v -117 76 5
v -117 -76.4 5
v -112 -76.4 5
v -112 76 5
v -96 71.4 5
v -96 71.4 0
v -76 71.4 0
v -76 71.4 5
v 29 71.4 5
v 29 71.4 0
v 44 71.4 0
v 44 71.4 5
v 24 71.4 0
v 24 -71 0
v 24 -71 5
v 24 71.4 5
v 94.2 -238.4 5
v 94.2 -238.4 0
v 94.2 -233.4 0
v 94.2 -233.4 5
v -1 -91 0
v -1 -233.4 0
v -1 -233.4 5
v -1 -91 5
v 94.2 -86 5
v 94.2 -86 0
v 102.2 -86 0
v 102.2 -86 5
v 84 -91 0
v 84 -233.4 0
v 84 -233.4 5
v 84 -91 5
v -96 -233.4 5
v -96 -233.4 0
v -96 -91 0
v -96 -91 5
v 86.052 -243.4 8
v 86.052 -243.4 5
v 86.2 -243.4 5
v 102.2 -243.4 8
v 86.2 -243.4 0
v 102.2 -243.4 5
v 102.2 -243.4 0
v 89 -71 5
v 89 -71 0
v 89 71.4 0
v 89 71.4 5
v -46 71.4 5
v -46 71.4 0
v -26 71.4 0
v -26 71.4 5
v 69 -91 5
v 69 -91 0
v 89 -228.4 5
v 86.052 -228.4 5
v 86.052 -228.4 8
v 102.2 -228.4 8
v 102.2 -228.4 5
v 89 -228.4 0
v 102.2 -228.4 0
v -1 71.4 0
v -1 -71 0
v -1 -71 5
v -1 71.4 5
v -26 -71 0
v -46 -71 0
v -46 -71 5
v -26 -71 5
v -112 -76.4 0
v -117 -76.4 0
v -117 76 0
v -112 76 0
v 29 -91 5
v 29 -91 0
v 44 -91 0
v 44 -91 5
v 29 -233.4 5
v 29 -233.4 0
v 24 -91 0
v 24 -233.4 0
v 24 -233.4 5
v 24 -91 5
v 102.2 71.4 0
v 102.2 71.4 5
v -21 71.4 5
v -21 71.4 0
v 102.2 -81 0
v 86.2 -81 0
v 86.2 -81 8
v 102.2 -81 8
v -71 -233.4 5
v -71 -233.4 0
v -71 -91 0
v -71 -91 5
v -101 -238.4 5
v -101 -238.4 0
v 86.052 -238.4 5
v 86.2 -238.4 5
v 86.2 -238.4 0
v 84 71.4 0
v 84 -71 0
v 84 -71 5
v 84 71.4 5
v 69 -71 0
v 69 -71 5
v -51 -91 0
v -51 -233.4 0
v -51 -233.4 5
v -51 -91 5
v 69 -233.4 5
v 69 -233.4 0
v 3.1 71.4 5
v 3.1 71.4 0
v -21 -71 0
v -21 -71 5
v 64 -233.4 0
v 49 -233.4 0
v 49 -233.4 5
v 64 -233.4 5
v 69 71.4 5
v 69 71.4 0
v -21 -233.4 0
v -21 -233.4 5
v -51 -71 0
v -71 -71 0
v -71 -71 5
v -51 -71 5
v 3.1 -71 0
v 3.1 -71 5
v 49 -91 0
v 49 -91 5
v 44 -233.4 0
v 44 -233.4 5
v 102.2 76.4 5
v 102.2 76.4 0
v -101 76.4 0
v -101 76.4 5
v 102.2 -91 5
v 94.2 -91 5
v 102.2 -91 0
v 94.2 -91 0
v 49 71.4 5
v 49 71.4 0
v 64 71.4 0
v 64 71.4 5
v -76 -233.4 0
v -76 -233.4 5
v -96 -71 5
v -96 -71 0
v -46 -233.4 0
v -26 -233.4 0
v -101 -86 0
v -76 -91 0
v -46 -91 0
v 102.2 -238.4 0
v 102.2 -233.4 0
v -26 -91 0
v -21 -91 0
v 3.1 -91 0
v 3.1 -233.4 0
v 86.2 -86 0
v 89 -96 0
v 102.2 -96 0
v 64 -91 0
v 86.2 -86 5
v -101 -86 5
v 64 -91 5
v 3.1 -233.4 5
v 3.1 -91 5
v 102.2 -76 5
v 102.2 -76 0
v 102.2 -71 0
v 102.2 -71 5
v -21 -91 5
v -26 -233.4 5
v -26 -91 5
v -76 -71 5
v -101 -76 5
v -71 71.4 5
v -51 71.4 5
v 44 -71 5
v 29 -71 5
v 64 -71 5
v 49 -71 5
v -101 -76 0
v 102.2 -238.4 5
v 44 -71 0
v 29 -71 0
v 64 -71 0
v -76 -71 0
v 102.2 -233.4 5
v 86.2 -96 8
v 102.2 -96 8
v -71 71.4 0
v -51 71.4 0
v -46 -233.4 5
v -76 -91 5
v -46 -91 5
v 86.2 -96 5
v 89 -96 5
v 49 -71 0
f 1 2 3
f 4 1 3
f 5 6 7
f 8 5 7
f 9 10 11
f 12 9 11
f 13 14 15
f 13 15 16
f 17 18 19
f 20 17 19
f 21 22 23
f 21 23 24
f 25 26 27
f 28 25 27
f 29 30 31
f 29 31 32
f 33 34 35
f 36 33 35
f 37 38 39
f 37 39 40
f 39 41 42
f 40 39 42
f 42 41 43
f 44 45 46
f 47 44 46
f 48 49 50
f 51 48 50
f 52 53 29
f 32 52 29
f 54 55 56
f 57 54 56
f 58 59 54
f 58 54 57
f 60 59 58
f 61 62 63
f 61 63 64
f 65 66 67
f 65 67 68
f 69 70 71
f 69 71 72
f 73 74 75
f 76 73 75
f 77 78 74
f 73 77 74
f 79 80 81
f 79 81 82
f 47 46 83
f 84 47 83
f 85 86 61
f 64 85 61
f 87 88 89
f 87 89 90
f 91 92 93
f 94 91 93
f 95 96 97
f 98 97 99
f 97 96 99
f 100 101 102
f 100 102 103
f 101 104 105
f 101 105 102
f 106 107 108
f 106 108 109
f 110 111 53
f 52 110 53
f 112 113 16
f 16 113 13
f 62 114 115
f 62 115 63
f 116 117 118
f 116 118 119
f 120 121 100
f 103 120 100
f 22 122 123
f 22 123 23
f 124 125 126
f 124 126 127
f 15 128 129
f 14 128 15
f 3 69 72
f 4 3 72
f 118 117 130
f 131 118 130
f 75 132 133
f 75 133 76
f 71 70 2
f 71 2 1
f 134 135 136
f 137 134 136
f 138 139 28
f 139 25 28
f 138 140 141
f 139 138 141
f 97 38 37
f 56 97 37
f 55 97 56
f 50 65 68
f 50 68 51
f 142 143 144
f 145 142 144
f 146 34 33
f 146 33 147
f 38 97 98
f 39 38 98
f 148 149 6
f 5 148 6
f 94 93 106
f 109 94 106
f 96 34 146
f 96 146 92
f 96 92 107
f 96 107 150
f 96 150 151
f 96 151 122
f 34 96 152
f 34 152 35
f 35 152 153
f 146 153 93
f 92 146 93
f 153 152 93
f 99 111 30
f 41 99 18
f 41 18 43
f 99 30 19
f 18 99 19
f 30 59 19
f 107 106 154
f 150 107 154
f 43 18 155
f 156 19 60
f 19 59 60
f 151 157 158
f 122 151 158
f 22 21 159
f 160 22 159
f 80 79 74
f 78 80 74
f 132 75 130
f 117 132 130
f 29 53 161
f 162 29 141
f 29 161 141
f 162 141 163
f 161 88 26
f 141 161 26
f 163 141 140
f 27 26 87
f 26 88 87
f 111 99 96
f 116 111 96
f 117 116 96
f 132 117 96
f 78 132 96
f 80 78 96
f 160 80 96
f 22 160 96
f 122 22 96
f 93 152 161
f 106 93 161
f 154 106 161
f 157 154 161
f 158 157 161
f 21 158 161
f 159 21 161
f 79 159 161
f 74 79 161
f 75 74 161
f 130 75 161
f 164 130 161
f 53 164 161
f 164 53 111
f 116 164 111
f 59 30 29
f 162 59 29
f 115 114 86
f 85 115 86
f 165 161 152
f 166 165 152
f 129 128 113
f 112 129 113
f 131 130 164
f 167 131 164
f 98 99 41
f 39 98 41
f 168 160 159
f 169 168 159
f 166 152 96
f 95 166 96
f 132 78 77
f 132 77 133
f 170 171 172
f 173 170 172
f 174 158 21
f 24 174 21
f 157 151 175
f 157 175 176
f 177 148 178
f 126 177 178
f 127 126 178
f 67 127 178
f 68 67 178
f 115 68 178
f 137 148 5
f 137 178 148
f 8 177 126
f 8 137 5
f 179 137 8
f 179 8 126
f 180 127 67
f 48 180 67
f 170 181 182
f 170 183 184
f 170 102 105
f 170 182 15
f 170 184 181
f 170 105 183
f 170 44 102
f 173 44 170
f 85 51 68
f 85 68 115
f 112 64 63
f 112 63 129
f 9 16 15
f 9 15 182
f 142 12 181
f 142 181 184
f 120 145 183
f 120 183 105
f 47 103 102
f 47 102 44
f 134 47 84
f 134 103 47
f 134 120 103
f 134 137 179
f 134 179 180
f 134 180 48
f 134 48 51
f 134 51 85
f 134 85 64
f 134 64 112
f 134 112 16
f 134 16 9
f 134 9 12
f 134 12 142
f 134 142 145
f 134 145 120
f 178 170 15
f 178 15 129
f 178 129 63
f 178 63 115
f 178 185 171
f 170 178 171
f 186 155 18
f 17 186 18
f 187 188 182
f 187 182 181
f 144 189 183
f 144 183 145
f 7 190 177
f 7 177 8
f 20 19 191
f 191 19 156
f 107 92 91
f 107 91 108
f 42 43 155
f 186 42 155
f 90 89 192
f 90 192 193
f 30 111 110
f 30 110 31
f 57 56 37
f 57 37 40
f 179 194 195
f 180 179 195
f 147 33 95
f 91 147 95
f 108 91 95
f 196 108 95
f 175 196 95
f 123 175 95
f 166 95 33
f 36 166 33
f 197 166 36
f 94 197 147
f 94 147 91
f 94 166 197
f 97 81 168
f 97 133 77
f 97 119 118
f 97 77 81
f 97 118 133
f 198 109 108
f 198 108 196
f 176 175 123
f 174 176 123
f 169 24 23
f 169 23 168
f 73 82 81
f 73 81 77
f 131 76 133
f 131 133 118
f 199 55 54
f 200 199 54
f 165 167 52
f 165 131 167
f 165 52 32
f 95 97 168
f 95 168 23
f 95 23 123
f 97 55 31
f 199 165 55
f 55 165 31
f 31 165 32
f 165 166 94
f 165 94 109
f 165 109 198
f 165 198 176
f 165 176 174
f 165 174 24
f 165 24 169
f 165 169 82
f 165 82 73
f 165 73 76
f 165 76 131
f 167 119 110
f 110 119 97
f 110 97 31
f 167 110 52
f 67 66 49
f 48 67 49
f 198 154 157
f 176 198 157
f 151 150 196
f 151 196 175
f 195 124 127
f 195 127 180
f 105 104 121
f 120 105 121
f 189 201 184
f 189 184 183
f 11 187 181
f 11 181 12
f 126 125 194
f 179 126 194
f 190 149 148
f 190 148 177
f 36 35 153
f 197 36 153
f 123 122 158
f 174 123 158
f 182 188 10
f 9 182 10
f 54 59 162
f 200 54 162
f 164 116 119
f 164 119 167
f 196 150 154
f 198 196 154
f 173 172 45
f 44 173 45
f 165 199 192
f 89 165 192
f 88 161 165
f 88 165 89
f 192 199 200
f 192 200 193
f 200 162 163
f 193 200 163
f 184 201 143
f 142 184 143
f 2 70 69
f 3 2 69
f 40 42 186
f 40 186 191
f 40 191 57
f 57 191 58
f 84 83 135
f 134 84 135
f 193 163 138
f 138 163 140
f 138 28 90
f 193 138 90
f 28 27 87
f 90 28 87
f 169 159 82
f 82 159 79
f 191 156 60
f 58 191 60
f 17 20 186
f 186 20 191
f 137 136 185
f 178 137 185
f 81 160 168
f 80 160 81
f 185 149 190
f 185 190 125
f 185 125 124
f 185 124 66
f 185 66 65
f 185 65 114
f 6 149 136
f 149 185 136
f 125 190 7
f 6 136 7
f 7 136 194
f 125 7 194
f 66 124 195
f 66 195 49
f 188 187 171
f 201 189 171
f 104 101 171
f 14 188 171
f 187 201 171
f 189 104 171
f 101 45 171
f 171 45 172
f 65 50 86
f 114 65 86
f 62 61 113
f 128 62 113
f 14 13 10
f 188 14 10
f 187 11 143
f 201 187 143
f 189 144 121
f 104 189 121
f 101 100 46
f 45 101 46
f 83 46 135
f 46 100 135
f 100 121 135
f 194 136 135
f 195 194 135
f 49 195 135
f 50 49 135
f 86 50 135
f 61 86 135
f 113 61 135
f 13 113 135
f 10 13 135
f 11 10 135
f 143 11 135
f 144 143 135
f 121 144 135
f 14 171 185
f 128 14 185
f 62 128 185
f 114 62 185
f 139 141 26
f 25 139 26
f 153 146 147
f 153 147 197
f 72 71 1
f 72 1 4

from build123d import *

# Parameters (mm, degrees)
F0_W     = 20
F0_H     = 142.4
F0_W_2   = 20.9
F0_W_3   = 15
F1_DEPTH = 5
F2_W     = 16
F2_H     = 15
F2_W_2   = 16.148469
F3_DEPTH = 3
F4_W     = 5
F4_H     = 152.4
F5_DEPTH = 5


with BuildPart() as f1:
    # F0 (on Top) → F1 (new body)
    with BuildSketch(Plane.XY):
        Polygon((102.2, 71.4), (102.2, 76.4), (-101, 76.4), (-101, -76), (102.2, -76), (102.2, -71), (89, -71), (89, 71.4), align=None)
        with Locations((-86, 0.2)):
            Rectangle(F0_W, F0_H, mode=Mode.SUBTRACT)
        with Locations((-61, 0.2)):
            Rectangle(F0_W, F0_H, mode=Mode.SUBTRACT)
        with Locations((-36, 0.2)):
            Rectangle(F0_W, F0_H, mode=Mode.SUBTRACT)
        with Locations((-11, 0.2)):
            Rectangle(F0_W, F0_H, mode=Mode.SUBTRACT)
        with Locations((13.55, 0.2)):
            Rectangle(F0_W_2, F0_H, mode=Mode.SUBTRACT)
        with Locations((36.5, 0.2)):
            Rectangle(F0_W_3, F0_H, mode=Mode.SUBTRACT)
        with Locations((56.5, 0.2)):
            Rectangle(F0_W_3, F0_H, mode=Mode.SUBTRACT)
        with Locations((76.5, 0.2)):
            Rectangle(F0_W_3, F0_H, mode=Mode.SUBTRACT)
        Polygon((-101, -238.4), (86.2, -238.4), (86.2, -243.4), (102.2, -243.4), (102.2, -238.4), (94.2, -238.4), (94.2, -233.4), (102.2, -233.4), (102.2, -228.4), (89, -228.4), (89, -96), (102.2, -96), (102.2, -91), (94.2, -91), (94.2, -86), (102.2, -86), (102.2, -81), (86.2, -81), (86.2, -86), (-101, -86), align=None)
        with Locations((-86, -162.2)):
            Rectangle(F0_W, F0_H, mode=Mode.SUBTRACT)
        with Locations((-61, -162.2)):
            Rectangle(F0_W, F0_H, mode=Mode.SUBTRACT)
        with Locations((-36, -162.2)):
            Rectangle(F0_W, F0_H, mode=Mode.SUBTRACT)
        with Locations((-11, -162.2)):
            Rectangle(F0_W, F0_H, mode=Mode.SUBTRACT)
        with Locations((13.55, -162.2)):
            Rectangle(F0_W_2, F0_H, mode=Mode.SUBTRACT)
        with Locations((36.5, -162.2)):
            Rectangle(F0_W_3, F0_H, mode=Mode.SUBTRACT)
        with Locations((56.5, -162.2)):
            Rectangle(F0_W_3, F0_H, mode=Mode.SUBTRACT)
        with Locations((76.5, -162.2)):
            Rectangle(F0_W_3, F0_H, mode=Mode.SUBTRACT)
    extrude(amount=F1_DEPTH)

    # F2 (on face) → F3 (join)
    with BuildSketch(Plane.XY.offset(5)):
        with Locations((94.2, -88.5)):
            Rectangle(F2_W, F2_H)
        with Locations((94.125765, -235.9)):
            Rectangle(F2_W_2, F2_H)
    extrude(amount=F3_DEPTH)


with BuildPart() as f5:
    # F4 (on Top) → F5 (new body)
    with BuildSketch(Plane.XY):
        with Locations((-114.5, -0.2)):
            Rectangle(F4_W, F4_H)
    extrude(amount=F5_DEPTH)


solid = Compound([f1.part, f5.part])
